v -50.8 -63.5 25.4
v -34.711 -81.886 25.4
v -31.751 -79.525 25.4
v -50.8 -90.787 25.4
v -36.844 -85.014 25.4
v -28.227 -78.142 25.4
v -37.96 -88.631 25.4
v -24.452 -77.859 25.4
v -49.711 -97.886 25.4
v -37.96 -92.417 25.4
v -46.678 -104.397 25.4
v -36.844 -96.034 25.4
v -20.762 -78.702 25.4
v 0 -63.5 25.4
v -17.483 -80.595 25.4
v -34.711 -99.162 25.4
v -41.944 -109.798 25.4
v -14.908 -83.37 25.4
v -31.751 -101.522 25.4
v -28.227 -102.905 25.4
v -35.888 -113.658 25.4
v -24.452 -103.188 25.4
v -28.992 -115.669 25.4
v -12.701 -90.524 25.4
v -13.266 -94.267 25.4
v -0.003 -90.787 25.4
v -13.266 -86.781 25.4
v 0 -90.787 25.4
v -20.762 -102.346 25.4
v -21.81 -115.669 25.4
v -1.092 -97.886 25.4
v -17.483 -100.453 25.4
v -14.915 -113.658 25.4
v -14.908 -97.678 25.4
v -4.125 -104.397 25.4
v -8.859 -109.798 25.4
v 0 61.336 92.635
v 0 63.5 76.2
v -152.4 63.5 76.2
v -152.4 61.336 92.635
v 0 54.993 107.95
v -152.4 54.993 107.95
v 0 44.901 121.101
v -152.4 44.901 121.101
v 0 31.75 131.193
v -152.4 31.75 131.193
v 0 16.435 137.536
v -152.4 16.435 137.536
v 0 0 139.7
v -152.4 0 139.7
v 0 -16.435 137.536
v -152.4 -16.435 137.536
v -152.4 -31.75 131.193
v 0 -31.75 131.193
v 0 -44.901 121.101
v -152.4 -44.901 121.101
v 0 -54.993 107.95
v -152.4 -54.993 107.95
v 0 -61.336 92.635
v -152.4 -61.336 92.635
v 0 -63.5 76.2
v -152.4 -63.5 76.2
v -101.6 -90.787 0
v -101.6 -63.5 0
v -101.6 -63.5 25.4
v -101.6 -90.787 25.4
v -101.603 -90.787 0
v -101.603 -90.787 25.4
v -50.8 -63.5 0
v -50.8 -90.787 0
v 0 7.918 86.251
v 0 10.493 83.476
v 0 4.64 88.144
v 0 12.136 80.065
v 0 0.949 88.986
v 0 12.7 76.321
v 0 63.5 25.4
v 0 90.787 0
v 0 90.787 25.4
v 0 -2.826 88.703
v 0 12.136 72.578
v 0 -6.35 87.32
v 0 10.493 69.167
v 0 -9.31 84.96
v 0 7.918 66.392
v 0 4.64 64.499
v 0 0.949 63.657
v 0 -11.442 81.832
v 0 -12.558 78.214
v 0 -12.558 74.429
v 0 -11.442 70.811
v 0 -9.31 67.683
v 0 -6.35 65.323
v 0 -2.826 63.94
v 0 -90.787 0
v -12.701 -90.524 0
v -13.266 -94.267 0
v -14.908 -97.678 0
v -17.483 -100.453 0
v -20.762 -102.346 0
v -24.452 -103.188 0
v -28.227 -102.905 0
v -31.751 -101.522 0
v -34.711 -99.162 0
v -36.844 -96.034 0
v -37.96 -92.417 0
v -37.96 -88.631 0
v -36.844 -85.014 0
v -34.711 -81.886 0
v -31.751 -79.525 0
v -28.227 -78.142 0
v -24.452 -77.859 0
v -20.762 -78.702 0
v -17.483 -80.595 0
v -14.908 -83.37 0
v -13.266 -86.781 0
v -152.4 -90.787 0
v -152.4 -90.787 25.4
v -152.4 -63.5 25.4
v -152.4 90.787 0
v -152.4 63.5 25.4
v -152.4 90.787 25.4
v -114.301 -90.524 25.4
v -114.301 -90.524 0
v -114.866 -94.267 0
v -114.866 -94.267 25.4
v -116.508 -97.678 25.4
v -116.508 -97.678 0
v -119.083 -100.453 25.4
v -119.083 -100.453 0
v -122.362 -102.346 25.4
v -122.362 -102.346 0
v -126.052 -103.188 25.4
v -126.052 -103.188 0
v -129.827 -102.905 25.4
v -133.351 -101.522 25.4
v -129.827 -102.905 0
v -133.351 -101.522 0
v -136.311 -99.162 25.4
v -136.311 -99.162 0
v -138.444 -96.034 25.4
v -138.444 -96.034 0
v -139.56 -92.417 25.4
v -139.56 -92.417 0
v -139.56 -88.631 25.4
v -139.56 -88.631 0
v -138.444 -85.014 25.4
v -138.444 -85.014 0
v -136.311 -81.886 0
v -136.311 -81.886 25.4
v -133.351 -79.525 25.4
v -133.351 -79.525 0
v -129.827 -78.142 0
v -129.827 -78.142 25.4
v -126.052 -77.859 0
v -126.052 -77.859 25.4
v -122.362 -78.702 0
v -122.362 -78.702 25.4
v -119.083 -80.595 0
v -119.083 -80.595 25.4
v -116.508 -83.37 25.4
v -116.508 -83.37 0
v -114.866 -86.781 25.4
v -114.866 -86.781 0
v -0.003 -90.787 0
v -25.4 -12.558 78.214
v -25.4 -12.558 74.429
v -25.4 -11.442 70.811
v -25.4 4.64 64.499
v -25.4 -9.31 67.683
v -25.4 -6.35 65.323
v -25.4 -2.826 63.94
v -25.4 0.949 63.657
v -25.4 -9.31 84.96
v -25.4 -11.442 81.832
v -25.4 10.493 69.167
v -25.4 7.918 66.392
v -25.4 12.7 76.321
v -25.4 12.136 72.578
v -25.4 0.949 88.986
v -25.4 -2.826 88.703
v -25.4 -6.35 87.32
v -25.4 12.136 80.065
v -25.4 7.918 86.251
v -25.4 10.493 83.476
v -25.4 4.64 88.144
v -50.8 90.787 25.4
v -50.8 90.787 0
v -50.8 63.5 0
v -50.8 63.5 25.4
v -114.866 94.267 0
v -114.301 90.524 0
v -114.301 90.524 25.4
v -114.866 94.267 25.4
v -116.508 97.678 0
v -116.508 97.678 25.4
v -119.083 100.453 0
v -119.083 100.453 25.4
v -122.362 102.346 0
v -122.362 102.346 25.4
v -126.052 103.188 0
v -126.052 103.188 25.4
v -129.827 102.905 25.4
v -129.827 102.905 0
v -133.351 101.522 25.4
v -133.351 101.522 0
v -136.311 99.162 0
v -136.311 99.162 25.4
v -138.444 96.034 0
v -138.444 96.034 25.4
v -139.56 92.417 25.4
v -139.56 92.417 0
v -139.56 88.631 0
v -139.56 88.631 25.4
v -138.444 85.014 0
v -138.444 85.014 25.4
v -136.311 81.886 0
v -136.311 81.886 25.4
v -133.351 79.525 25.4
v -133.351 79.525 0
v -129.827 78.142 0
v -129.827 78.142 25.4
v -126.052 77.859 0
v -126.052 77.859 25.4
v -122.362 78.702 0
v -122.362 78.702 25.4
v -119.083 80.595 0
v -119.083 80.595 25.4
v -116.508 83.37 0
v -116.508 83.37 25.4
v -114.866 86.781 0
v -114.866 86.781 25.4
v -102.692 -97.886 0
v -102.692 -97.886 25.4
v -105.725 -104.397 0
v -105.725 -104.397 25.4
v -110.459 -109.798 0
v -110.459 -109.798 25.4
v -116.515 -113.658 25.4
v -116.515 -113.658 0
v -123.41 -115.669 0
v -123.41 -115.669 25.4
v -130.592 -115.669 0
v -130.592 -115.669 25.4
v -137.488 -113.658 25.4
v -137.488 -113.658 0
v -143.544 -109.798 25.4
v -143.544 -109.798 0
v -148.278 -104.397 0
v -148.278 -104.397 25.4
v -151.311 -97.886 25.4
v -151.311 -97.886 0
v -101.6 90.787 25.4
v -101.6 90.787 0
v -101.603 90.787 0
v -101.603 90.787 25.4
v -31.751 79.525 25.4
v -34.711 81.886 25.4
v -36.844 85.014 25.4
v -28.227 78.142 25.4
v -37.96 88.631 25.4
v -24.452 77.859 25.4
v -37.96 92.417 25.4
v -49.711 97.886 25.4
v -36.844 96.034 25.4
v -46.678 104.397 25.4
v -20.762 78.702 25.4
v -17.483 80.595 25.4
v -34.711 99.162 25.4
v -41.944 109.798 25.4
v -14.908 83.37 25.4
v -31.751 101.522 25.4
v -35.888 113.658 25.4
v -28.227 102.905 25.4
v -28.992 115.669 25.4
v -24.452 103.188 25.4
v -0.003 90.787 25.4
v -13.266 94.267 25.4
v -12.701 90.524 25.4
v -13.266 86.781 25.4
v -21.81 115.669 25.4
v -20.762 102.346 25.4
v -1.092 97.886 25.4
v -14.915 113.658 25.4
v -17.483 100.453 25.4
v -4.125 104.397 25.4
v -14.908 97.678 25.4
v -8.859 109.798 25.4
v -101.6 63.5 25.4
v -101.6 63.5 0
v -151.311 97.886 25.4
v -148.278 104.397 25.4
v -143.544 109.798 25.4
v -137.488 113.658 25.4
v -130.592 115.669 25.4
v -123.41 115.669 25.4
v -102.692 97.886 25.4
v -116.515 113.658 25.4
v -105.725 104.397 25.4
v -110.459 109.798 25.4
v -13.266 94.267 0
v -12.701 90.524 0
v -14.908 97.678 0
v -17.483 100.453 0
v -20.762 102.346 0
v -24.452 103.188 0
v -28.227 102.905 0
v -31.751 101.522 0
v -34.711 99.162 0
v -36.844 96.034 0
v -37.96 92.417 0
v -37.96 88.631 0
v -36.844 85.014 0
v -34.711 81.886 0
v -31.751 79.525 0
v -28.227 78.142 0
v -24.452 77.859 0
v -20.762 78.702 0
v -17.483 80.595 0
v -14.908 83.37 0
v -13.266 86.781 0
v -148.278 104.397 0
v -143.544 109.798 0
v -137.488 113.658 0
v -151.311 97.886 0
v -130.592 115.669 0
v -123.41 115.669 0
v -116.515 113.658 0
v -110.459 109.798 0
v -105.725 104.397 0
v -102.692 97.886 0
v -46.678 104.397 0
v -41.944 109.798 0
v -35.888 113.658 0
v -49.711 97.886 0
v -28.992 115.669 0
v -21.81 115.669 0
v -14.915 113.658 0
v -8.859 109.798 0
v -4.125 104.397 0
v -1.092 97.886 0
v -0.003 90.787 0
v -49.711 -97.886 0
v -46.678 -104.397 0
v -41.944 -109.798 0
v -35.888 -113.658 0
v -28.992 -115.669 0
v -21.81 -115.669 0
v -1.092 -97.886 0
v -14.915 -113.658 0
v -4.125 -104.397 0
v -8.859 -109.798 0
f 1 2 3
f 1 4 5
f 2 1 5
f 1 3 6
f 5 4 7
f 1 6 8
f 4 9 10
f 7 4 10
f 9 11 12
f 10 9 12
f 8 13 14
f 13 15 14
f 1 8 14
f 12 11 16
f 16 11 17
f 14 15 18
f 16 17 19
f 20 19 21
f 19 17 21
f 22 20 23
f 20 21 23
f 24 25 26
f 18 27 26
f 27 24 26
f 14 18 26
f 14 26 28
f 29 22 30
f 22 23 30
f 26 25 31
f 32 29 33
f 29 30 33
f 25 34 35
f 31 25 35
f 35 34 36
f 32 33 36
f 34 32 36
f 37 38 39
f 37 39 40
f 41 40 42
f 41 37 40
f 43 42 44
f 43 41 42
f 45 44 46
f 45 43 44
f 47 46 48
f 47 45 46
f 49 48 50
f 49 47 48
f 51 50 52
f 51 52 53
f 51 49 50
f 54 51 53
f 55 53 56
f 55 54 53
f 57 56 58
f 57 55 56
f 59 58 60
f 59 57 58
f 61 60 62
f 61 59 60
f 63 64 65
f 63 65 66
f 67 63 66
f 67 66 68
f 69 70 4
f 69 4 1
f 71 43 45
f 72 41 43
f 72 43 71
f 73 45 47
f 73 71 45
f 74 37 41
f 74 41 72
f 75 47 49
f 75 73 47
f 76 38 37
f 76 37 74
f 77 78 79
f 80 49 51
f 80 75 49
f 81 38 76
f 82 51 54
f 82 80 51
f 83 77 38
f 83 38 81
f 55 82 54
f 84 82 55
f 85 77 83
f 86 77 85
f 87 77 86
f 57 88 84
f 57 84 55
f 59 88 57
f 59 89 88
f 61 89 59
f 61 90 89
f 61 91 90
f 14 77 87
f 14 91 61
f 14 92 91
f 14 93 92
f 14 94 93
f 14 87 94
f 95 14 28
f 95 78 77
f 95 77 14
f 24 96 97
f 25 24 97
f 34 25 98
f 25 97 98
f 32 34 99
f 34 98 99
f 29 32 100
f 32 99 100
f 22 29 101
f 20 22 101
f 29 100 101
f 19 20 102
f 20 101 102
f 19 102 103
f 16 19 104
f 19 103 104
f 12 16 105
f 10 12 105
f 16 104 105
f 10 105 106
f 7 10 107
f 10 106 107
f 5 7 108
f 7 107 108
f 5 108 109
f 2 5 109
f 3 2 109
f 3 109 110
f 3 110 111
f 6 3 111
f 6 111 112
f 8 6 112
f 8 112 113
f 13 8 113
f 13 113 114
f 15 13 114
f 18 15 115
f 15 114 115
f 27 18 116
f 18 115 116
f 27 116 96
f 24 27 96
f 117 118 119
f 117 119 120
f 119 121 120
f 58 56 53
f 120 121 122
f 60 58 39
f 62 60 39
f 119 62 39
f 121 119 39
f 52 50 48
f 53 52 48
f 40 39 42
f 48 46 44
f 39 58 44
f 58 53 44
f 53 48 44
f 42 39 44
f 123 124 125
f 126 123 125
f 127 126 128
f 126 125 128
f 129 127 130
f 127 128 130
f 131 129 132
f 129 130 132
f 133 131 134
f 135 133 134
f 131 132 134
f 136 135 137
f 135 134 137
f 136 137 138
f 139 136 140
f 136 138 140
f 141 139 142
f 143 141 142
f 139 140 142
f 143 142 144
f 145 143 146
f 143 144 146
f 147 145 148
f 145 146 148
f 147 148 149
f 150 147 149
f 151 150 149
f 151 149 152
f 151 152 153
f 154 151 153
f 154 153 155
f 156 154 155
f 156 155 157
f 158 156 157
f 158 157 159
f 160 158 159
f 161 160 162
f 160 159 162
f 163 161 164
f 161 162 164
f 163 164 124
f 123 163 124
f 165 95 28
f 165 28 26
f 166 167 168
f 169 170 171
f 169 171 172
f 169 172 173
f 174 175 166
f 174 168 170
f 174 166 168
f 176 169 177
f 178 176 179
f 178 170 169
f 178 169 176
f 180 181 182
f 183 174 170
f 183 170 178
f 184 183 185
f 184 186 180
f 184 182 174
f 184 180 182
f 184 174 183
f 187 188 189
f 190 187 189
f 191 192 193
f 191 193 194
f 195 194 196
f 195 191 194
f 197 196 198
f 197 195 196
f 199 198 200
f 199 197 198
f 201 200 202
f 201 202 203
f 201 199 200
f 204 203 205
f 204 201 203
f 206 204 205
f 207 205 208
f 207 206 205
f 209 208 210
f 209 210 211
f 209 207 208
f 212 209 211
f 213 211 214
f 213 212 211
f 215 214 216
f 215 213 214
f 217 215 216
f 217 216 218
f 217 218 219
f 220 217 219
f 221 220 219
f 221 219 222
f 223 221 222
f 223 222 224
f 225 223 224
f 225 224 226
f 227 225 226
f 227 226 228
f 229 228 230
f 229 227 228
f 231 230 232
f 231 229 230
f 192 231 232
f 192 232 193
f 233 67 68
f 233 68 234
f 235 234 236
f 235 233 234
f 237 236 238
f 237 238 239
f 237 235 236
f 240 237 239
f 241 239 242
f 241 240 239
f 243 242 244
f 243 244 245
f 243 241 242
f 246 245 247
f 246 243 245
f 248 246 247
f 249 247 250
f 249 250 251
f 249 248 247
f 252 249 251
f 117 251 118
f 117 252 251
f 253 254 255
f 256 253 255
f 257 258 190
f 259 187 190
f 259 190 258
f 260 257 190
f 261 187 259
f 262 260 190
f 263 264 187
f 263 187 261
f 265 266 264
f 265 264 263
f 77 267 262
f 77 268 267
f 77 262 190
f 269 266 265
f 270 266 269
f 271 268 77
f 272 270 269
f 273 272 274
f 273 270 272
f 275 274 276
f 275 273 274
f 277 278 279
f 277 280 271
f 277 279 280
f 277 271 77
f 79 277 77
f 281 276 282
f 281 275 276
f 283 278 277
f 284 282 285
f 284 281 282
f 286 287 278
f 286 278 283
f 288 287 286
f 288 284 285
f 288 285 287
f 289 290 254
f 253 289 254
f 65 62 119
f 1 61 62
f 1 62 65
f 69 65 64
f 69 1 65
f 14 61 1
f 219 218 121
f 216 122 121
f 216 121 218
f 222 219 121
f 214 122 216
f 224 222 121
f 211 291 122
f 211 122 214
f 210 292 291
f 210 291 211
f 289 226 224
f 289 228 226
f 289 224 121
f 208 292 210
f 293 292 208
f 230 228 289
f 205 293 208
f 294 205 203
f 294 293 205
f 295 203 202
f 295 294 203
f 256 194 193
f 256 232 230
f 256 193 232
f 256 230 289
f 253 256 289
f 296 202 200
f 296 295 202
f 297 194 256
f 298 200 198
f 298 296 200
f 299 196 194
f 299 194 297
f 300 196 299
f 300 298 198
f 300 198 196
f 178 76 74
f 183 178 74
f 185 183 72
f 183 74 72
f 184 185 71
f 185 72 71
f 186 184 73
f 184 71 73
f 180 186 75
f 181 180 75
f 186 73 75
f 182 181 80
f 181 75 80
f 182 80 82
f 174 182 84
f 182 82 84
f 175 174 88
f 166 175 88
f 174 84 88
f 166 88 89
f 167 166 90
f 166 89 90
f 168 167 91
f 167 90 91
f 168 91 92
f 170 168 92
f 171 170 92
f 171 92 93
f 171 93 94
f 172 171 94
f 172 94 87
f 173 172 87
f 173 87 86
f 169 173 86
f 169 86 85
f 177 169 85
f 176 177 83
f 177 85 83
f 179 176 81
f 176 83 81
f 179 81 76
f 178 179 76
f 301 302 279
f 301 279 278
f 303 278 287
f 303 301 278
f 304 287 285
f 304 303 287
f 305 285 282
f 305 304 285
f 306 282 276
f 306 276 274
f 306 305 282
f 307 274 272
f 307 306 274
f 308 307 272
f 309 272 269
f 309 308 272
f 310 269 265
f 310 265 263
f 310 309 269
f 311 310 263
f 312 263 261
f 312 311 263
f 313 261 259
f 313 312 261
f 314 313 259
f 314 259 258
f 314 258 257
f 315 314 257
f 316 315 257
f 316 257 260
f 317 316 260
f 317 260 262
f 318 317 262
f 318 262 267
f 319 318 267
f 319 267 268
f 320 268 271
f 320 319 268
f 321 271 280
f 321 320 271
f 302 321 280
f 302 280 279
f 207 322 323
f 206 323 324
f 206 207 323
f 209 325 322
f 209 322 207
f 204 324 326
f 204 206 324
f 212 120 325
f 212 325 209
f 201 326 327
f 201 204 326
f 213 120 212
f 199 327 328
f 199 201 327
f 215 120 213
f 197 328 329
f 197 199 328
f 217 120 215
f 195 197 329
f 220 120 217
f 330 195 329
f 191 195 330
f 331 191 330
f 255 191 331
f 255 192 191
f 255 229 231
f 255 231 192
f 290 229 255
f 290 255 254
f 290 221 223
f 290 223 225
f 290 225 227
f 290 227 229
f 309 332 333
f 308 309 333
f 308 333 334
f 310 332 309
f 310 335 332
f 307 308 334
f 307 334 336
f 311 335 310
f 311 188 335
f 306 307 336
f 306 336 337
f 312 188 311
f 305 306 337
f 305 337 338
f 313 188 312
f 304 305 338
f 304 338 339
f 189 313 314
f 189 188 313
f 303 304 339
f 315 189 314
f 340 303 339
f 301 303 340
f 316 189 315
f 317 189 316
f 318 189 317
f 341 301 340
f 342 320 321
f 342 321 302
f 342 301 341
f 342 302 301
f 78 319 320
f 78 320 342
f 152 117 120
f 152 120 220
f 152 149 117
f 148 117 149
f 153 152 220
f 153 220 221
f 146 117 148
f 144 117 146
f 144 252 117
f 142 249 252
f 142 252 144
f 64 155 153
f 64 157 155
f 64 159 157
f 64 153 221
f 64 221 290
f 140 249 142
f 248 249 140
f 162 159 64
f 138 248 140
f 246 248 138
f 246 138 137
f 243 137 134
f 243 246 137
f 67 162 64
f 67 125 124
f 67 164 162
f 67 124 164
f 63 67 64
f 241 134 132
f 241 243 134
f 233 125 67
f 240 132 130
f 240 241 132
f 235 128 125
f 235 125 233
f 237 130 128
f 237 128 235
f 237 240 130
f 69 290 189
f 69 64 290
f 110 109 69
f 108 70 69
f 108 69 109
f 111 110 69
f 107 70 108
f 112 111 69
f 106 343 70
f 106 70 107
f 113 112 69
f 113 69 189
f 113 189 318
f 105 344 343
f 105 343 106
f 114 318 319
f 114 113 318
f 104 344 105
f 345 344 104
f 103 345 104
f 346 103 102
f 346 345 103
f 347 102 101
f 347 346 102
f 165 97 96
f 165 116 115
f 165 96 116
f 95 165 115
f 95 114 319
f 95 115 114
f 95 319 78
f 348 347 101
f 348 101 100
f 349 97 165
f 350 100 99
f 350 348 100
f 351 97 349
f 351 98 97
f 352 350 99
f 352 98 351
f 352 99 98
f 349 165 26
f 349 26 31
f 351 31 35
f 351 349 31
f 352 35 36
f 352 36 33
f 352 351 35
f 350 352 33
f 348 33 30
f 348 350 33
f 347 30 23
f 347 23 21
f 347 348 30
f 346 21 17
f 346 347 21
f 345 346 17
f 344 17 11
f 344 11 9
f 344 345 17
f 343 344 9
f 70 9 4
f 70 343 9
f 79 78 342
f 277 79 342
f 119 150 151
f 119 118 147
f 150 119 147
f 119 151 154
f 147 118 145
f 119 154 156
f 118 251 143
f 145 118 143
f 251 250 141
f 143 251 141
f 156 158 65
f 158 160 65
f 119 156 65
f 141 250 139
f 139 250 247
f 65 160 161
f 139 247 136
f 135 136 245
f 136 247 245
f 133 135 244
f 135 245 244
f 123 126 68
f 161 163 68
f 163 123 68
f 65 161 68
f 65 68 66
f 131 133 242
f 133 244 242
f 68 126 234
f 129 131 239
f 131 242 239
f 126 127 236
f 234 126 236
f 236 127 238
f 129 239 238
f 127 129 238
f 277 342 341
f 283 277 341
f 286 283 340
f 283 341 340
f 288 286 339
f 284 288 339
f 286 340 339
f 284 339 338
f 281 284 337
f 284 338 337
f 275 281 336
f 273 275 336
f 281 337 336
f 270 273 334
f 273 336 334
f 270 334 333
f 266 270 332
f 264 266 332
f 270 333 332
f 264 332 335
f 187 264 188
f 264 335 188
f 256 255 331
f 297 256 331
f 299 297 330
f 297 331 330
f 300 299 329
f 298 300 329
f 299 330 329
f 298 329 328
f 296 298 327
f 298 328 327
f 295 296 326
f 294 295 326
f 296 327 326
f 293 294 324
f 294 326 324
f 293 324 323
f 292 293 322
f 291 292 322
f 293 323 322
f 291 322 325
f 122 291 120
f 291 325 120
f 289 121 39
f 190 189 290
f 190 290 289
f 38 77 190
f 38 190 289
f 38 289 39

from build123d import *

# Parameters (mm, degrees)
F1_DEPTH = 152.4
F3_R     = 12.7
F4_DEPTH = 25.4
F5_R     = 12.7
F6_DEPTH = 25.4


# Not quite as in the source:
# - a pattern or mirror of a feature is missing from the dataset's text; its kind, count and spacing are read off the source's solid


with BuildPart() as f1:
    # F0 (on Right) → F1 (new body)
    with BuildSketch(Plane.YZ):
        with BuildLine():
            Line((63.5, 12.7), (63.5, 76.2))
            ThreePointArc((63.5, 76.2), (0, 139.7), (-63.5, 76.2))
            Line((-63.5, 76.2), (-63.5, 12.7))
            Line((-63.5, 12.7), (-63.5, 0))
            Line((-63.5, 0), (63.5, 0))
            Line((63.5, 0), (63.5, 12.7))
        make_face()
    extrude(amount=-F1_DEPTH)

    # F3 (on Top) → F4 (join)
    with BuildSketch(Plane.XY):
        with BuildLine():
            Line((0, 90.7872649688), (-0.002730534, 90.7872649688))
            ThreePointArc((-0.002730534, 90.7872649688), (-25.401365267, 115.9239140637), (-50.8, 90.7872649688))
            Line((-50.8, 90.7872649688), (-50.8, 63.5))
            Line((-50.8, 63.5), (0, 63.5))
            Line((0, 63.5), (0, 90.7872649688))
        make_face()
        with Locations((-25.401365267, 90.5239140637)):
            Circle(F3_R, mode=Mode.SUBTRACT)
        with BuildLine():
            Line((-101.6, 90.7872649688), (-101.602730534, 90.7872649688))
            ThreePointArc((-101.602730534, 90.7872649688), (-127.001365267, 115.9239140637), (-152.4, 90.7872649688))
            Line((-152.4, 90.7872649688), (-152.4, 63.5))
            Line((-152.4, 63.5), (-101.6, 63.5))
            Line((-101.6, 63.5), (-101.6, 90.7872649688))
        make_face()
        with Locations((-127.001365267, 90.5239140637)):
            Circle(F3_R, mode=Mode.SUBTRACT)
    f4 = extrude(amount=F4_DEPTH)

    # F4_copies: F4 across plane
    add(f4.mirror(Plane(origin=(0, 0, 0), x_dir=(0, 0, -1), z_dir=(0, -1, 0))))

    # F5 (on face) → F6 (cut)
    with BuildSketch(Plane.YZ):
        with Locations((0, 76.3214752078)):
            Circle(F5_R)
    extrude(amount=-F6_DEPTH, mode=Mode.SUBTRACT)


solid = f1.part
